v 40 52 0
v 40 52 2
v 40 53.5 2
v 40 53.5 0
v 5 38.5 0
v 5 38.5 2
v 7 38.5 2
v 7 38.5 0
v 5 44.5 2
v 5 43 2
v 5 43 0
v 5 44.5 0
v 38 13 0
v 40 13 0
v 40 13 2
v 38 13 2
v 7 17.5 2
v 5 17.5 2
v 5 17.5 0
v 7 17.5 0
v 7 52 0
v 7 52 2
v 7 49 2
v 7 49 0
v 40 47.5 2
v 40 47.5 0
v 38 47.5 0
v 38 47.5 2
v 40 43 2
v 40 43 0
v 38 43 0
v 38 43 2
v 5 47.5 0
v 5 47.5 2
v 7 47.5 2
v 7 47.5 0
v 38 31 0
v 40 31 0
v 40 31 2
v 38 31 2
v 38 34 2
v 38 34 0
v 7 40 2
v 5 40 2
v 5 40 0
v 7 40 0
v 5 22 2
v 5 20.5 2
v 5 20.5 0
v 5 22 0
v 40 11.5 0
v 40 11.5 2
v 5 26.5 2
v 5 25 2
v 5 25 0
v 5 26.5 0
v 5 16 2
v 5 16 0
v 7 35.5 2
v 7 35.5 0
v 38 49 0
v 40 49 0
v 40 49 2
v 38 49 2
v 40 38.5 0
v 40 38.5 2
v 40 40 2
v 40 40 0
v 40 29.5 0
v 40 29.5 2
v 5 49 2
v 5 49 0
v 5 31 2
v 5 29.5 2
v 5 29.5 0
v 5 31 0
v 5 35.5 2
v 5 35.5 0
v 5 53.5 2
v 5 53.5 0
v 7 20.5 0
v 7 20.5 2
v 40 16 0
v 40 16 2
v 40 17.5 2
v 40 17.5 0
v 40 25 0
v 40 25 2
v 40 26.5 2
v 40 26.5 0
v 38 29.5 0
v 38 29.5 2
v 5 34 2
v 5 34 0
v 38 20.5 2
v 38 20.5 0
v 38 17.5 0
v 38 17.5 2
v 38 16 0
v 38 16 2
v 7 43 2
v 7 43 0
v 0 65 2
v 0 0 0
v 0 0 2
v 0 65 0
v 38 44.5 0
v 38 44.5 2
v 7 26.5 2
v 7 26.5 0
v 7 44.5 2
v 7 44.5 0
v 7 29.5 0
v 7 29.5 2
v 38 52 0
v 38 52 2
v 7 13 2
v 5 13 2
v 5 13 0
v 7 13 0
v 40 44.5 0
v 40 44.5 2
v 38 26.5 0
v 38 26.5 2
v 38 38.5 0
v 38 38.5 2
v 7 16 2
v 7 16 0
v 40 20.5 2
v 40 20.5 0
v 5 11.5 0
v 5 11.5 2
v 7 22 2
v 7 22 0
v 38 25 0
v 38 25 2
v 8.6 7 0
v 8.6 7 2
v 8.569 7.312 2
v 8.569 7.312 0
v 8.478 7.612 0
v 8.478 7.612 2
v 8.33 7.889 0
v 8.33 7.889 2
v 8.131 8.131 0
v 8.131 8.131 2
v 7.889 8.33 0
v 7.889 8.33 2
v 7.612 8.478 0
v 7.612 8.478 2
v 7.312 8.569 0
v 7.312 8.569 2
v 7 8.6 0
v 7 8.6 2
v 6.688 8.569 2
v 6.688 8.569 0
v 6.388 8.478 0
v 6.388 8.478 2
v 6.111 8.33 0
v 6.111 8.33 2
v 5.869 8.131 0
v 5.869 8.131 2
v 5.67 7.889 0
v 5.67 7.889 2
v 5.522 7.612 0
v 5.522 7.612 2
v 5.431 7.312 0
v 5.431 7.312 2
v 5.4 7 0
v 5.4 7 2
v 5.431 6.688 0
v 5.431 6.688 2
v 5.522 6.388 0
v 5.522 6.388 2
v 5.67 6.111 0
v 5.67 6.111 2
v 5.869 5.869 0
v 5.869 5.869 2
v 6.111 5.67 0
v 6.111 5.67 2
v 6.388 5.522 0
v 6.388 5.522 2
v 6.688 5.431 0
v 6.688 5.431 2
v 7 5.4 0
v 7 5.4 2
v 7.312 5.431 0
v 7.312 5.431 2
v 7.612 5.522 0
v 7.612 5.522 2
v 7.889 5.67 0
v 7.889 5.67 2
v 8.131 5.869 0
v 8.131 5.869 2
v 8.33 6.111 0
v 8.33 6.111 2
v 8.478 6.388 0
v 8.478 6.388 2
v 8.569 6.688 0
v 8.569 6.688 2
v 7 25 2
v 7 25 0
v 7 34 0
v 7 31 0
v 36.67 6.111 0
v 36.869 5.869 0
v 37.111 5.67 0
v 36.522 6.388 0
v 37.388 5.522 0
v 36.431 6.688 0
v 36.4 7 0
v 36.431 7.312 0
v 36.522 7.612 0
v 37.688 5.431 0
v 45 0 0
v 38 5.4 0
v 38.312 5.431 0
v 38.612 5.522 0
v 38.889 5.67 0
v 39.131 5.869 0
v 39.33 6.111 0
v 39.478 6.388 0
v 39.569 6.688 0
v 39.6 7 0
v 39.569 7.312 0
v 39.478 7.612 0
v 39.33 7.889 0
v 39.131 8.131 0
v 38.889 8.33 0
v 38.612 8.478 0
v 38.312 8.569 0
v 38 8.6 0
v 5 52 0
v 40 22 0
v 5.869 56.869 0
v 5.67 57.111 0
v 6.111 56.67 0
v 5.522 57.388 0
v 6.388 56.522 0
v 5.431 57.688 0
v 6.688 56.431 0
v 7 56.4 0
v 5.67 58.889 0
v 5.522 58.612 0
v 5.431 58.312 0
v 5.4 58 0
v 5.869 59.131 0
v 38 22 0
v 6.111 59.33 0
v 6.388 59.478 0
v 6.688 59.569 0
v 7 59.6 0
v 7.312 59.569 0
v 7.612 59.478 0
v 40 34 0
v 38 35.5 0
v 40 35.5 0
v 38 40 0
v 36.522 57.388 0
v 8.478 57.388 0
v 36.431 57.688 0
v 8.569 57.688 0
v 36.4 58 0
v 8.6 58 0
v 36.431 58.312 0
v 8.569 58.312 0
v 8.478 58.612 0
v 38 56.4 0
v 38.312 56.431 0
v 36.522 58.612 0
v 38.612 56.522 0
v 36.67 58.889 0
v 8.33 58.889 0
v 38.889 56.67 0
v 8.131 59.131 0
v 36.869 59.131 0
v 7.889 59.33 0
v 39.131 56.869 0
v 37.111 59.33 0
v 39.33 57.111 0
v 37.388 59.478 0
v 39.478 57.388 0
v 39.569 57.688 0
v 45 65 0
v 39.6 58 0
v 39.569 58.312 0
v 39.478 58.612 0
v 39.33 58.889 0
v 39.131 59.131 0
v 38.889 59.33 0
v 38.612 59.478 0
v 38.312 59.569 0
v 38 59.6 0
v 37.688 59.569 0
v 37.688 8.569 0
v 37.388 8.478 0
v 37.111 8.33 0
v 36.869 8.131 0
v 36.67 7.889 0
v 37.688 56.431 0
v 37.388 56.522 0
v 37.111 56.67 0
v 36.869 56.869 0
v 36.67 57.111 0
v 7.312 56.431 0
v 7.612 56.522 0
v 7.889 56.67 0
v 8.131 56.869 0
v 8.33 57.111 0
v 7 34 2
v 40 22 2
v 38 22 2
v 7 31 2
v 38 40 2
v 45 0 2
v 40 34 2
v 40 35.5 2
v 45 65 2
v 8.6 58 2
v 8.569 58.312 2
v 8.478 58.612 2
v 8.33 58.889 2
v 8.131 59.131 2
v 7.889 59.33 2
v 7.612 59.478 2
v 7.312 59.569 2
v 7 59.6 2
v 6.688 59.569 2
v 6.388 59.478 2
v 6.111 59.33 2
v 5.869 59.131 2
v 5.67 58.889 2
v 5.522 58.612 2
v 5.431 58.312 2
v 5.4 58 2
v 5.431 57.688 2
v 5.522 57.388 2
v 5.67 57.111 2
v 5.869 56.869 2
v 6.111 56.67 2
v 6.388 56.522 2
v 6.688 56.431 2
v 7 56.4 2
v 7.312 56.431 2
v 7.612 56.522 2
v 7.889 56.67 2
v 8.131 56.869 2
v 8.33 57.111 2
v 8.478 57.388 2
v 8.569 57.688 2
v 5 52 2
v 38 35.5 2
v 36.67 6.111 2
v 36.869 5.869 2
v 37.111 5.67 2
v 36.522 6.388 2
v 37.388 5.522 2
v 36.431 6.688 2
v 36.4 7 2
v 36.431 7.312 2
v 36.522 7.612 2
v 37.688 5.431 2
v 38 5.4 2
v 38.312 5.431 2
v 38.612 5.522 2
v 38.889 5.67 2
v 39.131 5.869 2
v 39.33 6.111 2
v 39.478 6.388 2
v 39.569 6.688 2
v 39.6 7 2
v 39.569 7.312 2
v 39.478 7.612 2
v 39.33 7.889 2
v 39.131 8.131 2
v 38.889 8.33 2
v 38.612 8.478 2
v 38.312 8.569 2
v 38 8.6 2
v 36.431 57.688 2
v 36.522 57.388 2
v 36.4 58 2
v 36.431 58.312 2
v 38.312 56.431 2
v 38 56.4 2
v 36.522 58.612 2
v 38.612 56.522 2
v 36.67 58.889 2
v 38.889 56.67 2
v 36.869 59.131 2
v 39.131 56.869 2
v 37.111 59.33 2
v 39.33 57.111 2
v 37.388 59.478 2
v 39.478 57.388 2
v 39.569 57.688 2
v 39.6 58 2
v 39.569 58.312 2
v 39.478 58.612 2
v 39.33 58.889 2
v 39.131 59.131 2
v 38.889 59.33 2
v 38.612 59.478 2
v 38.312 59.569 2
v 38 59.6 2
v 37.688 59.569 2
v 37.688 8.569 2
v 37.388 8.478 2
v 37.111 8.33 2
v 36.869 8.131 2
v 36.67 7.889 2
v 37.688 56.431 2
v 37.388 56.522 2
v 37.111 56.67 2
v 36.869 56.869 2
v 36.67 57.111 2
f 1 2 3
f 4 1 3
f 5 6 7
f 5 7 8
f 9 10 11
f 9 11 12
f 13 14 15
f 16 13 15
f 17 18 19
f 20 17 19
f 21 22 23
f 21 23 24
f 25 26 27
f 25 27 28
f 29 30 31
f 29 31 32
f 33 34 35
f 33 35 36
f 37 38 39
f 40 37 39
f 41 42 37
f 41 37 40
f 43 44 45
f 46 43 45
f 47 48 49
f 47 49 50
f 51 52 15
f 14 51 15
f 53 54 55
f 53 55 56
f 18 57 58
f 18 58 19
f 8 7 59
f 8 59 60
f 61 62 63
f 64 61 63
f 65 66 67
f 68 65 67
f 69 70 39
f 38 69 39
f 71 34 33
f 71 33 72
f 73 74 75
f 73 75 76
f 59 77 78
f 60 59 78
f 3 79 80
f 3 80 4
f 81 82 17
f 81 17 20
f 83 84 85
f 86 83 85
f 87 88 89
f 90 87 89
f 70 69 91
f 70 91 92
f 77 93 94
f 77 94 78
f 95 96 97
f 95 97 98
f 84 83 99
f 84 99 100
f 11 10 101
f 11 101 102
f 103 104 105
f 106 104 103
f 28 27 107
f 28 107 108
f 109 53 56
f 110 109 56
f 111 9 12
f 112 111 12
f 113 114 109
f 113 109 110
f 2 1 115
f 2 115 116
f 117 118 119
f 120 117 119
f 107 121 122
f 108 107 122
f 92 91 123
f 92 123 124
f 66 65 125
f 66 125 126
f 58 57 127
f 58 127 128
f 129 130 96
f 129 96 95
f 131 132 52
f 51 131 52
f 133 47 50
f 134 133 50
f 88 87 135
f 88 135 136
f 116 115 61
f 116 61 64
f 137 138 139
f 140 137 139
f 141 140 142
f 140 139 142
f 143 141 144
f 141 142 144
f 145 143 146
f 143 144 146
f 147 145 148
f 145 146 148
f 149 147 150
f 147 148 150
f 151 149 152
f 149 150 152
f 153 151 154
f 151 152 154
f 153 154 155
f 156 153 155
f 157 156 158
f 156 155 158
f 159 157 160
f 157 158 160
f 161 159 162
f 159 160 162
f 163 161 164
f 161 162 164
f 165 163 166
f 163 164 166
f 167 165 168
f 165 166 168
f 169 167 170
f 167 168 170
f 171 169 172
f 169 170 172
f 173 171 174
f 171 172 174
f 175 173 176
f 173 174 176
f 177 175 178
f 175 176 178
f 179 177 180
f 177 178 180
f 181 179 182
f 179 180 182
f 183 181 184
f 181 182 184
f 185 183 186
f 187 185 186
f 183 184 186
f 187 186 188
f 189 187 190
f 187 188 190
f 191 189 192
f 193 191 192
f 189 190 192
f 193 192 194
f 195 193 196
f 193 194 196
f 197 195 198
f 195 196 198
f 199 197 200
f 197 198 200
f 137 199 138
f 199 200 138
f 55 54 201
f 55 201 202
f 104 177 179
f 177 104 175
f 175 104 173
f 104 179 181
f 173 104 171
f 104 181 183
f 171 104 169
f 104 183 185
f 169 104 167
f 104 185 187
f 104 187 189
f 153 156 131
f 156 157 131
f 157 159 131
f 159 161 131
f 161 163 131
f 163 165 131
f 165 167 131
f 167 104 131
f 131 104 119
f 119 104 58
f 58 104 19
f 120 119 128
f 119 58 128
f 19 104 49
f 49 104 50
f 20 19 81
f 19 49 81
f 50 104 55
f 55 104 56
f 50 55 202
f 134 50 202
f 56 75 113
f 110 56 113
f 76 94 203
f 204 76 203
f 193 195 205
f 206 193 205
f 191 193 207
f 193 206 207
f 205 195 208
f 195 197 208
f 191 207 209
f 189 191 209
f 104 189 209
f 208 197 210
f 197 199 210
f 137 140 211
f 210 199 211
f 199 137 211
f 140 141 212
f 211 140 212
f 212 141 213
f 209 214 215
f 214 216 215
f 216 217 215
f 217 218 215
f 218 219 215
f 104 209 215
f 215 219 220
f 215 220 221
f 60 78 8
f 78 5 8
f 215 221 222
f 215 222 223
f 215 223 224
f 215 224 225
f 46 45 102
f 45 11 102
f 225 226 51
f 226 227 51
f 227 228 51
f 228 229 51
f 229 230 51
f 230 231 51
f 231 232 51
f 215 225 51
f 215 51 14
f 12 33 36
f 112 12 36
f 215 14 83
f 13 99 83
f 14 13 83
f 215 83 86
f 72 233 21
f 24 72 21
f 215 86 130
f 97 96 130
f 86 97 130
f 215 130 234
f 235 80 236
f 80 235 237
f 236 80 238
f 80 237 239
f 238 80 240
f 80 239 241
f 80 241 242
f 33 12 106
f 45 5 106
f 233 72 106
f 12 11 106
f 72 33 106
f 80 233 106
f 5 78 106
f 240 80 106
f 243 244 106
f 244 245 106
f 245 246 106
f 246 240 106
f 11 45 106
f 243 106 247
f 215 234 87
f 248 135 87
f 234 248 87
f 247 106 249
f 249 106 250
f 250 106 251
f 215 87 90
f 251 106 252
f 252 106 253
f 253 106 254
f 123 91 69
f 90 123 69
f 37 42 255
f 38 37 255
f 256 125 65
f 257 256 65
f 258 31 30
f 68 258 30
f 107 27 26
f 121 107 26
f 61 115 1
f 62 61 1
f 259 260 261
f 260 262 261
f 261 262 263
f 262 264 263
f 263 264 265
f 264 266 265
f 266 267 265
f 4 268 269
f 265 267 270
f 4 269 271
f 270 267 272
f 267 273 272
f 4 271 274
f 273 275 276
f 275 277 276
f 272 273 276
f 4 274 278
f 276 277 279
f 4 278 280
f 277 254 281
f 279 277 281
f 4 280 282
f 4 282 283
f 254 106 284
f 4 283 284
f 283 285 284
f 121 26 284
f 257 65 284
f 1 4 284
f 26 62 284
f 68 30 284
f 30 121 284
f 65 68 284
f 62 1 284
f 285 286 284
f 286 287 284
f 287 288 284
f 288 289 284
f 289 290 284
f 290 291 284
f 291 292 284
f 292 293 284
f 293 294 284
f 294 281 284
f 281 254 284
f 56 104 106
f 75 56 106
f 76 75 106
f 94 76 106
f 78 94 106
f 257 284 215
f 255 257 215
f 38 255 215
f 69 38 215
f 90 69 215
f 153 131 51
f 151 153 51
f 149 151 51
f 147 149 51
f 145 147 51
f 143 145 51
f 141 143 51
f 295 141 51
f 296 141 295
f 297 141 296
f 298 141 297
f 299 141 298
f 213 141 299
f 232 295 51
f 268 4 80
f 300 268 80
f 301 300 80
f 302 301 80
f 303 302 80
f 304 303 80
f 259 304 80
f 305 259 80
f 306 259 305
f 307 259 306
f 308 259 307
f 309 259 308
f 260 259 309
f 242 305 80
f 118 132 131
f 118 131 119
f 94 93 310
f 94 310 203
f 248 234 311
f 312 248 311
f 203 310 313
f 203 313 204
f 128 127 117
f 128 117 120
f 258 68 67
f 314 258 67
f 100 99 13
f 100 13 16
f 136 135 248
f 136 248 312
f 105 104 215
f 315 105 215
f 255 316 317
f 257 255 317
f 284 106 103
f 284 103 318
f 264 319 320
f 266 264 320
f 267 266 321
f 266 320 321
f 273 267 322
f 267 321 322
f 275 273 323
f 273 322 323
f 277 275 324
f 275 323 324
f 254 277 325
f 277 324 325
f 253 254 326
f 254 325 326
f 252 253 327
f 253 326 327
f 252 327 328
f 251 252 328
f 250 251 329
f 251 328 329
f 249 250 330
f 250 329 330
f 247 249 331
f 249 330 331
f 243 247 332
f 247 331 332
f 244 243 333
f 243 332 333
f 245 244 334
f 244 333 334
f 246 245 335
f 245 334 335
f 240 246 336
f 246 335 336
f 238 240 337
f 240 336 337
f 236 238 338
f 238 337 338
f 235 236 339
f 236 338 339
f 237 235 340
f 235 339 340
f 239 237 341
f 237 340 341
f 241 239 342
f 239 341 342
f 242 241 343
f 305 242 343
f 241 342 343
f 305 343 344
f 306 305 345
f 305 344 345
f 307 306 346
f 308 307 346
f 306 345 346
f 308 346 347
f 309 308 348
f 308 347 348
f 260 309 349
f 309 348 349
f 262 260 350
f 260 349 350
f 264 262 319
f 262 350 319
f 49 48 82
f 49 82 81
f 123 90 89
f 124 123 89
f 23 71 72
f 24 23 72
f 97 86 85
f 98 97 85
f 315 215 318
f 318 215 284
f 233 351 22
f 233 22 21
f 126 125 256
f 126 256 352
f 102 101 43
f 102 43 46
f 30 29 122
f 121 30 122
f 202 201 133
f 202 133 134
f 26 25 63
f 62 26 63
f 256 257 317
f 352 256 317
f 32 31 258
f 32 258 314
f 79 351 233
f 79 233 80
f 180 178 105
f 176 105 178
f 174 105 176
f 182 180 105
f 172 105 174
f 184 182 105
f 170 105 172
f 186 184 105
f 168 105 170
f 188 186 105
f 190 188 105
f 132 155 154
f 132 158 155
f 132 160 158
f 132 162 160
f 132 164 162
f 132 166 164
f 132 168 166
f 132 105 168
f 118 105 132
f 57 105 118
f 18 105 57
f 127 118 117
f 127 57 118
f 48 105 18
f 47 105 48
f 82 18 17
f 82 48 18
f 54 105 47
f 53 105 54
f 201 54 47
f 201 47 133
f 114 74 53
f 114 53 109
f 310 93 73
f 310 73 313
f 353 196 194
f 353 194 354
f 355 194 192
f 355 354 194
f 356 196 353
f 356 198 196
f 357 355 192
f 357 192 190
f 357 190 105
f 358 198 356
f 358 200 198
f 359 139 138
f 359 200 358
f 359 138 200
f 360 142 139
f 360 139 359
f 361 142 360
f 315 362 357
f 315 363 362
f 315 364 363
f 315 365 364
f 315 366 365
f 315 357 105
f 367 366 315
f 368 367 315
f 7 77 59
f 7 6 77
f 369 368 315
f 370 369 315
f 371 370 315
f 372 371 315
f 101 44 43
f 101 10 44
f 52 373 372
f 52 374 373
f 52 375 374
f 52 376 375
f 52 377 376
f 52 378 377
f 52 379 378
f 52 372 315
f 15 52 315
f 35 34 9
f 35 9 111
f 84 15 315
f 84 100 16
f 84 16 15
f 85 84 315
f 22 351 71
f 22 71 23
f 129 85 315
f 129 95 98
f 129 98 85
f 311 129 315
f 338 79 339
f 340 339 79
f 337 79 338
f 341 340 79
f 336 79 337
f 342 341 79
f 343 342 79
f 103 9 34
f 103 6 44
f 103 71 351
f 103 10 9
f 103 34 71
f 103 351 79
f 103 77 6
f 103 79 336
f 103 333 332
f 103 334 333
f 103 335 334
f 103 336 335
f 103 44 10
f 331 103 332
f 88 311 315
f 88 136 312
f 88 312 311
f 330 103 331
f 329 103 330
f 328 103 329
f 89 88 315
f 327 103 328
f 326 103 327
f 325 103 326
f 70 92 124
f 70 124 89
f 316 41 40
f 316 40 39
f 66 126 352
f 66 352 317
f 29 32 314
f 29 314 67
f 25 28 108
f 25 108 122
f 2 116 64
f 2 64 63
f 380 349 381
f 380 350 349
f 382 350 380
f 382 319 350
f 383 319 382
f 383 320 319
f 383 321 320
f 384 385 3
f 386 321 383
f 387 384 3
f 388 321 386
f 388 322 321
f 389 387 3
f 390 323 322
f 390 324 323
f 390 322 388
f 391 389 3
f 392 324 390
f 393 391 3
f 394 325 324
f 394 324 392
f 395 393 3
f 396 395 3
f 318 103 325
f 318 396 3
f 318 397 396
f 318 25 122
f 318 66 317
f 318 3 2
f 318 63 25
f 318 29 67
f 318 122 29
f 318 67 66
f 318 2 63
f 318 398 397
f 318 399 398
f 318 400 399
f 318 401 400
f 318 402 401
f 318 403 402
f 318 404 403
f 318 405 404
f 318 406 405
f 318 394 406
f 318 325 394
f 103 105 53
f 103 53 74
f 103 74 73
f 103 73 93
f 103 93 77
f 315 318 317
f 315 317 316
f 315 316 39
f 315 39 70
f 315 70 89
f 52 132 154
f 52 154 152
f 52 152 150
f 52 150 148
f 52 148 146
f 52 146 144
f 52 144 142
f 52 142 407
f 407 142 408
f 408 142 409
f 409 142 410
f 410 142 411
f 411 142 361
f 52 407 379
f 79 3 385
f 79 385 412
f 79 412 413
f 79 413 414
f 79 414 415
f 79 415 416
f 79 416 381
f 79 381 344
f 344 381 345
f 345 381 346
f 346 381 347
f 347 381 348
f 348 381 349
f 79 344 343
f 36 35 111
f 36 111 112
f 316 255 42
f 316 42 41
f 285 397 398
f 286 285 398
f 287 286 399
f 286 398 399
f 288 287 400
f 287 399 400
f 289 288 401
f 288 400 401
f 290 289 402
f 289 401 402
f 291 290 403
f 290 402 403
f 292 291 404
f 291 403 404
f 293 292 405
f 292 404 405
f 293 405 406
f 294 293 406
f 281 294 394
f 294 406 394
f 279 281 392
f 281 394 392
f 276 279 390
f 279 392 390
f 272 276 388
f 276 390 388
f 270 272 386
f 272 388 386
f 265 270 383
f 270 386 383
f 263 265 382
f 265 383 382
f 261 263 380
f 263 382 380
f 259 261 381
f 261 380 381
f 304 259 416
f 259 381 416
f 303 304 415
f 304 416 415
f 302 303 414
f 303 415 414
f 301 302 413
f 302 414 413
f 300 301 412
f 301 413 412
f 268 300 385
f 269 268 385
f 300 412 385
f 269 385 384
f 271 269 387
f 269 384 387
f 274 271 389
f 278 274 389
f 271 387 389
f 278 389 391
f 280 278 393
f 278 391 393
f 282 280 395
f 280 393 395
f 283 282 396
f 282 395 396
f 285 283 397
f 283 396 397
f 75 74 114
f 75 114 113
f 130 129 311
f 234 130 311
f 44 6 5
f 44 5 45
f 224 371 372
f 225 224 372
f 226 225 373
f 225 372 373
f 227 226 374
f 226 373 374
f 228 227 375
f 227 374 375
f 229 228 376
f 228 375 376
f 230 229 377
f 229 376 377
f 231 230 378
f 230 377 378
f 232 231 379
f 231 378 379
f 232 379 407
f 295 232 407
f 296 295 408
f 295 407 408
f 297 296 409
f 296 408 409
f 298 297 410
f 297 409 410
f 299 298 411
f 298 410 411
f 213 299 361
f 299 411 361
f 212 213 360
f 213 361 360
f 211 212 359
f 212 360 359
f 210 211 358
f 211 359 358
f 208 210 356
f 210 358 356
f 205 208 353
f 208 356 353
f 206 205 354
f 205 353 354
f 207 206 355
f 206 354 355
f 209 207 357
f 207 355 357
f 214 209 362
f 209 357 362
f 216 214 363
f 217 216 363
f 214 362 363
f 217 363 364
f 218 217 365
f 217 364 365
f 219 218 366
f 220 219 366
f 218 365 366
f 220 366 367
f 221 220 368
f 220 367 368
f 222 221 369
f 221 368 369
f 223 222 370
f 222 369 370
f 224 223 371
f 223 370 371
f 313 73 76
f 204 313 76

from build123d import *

# Parameters (mm, degrees)
SKIZZE1_W                       = 45
SKIZZE1_H                       = 65
AUFSATZ_LINEAR_AUSTRAGEN1_DEPTH = 2
SKIZZE3_W                       = 35
SKIZZE3_H                       = 42
SCHNITT_LINEAR_AUSTRAGEN1_DEPTH = 2
SKIZZE4_W                       = 2
SKIZZE4_H                       = 3
AUFSATZ_LINEAR_AUSTRAGEN2_DEPTH = 2
SKIZZE5_W                       = 2
SKIZZE5_H                       = 3
AUFSATZ_LINEAR_AUSTRAGEN3_DEPTH = 2
SKIZZE6_R                       = 1.6
SCHNITT_LINEAR_AUSTRAGEN2_DEPTH = 2


with BuildPart() as part:
    # Skizze1 → Aufsatz-Linear austragen1 (new body)
    with BuildSketch(Plane.XY):
        with Locations((22.5, 32.5)):
            Rectangle(SKIZZE1_W, SKIZZE1_H)
    extrude(amount=AUFSATZ_LINEAR_AUSTRAGEN1_DEPTH)

    # Skizze3 → Schnitt-Linear austragen1 (cut)
    with BuildSketch(Plane.XY.offset(2)):
        with Locations((22.5, 32.5)):
            Rectangle(SKIZZE3_W, SKIZZE3_H)
    extrude(amount=-SCHNITT_LINEAR_AUSTRAGEN1_DEPTH, mode=Mode.SUBTRACT)

    # Skizze4 → Aufsatz-Linear austragen2 (add)
    with BuildSketch(Plane(origin=(5, 0, 0), x_dir=(0, 0, -1), z_dir=(1, 0, 0))):
        with Locations((-1, 50.5)):
            Rectangle(SKIZZE4_W, SKIZZE4_H)
        with Locations((-1, 46)):
            Rectangle(SKIZZE4_W, SKIZZE4_H)
        with Locations((-1, 41.5)):
            Rectangle(SKIZZE4_W, SKIZZE4_H)
        with Locations((-1, 37)):
            Rectangle(SKIZZE4_W, SKIZZE4_H)
        with Locations((-1, 32.5)):
            Rectangle(SKIZZE4_W, SKIZZE4_H)
        with Locations((-1, 28)):
            Rectangle(SKIZZE4_W, SKIZZE4_H)
        with Locations((-1, 23.5)):
            Rectangle(SKIZZE4_W, SKIZZE4_H)
        with Locations((-1, 19)):
            Rectangle(SKIZZE4_W, SKIZZE4_H)
        with Locations((-1, 14.5)):
            Rectangle(SKIZZE4_W, SKIZZE4_H)
    extrude(amount=AUFSATZ_LINEAR_AUSTRAGEN2_DEPTH)

    # Skizze5 → Aufsatz-Linear austragen3 (add)
    with BuildSketch(Plane.ZY.offset(-40)):
        with Locations((1, 50.5)):
            Rectangle(SKIZZE5_W, SKIZZE5_H)
        with Locations((1, 46)):
            Rectangle(SKIZZE5_W, SKIZZE5_H)
        with Locations((1, 41.5)):
            Rectangle(SKIZZE5_W, SKIZZE5_H)
        with Locations((1, 37)):
            Rectangle(SKIZZE5_W, SKIZZE5_H)
        with Locations((1, 32.5)):
            Rectangle(SKIZZE5_W, SKIZZE5_H)
        with Locations((1, 28)):
            Rectangle(SKIZZE5_W, SKIZZE5_H)
        with Locations((1, 23.5)):
            Rectangle(SKIZZE5_W, SKIZZE5_H)
        with Locations((1, 19)):
            Rectangle(SKIZZE5_W, SKIZZE5_H)
        with Locations((1, 14.5)):
            Rectangle(SKIZZE5_W, SKIZZE5_H)
    extrude(amount=AUFSATZ_LINEAR_AUSTRAGEN3_DEPTH)

    # Skizze6 → Schnitt-Linear austragen2 (cut)
    with BuildSketch(Plane.XY.offset(2)):
        with Locations((7, 58)):
            Circle(SKIZZE6_R)
        with Locations((38, 58)):
            Circle(SKIZZE6_R)
        with Locations((38, 7)):
            Circle(SKIZZE6_R)
        with Locations((7, 7)):
            Circle(SKIZZE6_R)
    extrude(amount=-SCHNITT_LINEAR_AUSTRAGEN2_DEPTH, mode=Mode.SUBTRACT)


solid = part.part
